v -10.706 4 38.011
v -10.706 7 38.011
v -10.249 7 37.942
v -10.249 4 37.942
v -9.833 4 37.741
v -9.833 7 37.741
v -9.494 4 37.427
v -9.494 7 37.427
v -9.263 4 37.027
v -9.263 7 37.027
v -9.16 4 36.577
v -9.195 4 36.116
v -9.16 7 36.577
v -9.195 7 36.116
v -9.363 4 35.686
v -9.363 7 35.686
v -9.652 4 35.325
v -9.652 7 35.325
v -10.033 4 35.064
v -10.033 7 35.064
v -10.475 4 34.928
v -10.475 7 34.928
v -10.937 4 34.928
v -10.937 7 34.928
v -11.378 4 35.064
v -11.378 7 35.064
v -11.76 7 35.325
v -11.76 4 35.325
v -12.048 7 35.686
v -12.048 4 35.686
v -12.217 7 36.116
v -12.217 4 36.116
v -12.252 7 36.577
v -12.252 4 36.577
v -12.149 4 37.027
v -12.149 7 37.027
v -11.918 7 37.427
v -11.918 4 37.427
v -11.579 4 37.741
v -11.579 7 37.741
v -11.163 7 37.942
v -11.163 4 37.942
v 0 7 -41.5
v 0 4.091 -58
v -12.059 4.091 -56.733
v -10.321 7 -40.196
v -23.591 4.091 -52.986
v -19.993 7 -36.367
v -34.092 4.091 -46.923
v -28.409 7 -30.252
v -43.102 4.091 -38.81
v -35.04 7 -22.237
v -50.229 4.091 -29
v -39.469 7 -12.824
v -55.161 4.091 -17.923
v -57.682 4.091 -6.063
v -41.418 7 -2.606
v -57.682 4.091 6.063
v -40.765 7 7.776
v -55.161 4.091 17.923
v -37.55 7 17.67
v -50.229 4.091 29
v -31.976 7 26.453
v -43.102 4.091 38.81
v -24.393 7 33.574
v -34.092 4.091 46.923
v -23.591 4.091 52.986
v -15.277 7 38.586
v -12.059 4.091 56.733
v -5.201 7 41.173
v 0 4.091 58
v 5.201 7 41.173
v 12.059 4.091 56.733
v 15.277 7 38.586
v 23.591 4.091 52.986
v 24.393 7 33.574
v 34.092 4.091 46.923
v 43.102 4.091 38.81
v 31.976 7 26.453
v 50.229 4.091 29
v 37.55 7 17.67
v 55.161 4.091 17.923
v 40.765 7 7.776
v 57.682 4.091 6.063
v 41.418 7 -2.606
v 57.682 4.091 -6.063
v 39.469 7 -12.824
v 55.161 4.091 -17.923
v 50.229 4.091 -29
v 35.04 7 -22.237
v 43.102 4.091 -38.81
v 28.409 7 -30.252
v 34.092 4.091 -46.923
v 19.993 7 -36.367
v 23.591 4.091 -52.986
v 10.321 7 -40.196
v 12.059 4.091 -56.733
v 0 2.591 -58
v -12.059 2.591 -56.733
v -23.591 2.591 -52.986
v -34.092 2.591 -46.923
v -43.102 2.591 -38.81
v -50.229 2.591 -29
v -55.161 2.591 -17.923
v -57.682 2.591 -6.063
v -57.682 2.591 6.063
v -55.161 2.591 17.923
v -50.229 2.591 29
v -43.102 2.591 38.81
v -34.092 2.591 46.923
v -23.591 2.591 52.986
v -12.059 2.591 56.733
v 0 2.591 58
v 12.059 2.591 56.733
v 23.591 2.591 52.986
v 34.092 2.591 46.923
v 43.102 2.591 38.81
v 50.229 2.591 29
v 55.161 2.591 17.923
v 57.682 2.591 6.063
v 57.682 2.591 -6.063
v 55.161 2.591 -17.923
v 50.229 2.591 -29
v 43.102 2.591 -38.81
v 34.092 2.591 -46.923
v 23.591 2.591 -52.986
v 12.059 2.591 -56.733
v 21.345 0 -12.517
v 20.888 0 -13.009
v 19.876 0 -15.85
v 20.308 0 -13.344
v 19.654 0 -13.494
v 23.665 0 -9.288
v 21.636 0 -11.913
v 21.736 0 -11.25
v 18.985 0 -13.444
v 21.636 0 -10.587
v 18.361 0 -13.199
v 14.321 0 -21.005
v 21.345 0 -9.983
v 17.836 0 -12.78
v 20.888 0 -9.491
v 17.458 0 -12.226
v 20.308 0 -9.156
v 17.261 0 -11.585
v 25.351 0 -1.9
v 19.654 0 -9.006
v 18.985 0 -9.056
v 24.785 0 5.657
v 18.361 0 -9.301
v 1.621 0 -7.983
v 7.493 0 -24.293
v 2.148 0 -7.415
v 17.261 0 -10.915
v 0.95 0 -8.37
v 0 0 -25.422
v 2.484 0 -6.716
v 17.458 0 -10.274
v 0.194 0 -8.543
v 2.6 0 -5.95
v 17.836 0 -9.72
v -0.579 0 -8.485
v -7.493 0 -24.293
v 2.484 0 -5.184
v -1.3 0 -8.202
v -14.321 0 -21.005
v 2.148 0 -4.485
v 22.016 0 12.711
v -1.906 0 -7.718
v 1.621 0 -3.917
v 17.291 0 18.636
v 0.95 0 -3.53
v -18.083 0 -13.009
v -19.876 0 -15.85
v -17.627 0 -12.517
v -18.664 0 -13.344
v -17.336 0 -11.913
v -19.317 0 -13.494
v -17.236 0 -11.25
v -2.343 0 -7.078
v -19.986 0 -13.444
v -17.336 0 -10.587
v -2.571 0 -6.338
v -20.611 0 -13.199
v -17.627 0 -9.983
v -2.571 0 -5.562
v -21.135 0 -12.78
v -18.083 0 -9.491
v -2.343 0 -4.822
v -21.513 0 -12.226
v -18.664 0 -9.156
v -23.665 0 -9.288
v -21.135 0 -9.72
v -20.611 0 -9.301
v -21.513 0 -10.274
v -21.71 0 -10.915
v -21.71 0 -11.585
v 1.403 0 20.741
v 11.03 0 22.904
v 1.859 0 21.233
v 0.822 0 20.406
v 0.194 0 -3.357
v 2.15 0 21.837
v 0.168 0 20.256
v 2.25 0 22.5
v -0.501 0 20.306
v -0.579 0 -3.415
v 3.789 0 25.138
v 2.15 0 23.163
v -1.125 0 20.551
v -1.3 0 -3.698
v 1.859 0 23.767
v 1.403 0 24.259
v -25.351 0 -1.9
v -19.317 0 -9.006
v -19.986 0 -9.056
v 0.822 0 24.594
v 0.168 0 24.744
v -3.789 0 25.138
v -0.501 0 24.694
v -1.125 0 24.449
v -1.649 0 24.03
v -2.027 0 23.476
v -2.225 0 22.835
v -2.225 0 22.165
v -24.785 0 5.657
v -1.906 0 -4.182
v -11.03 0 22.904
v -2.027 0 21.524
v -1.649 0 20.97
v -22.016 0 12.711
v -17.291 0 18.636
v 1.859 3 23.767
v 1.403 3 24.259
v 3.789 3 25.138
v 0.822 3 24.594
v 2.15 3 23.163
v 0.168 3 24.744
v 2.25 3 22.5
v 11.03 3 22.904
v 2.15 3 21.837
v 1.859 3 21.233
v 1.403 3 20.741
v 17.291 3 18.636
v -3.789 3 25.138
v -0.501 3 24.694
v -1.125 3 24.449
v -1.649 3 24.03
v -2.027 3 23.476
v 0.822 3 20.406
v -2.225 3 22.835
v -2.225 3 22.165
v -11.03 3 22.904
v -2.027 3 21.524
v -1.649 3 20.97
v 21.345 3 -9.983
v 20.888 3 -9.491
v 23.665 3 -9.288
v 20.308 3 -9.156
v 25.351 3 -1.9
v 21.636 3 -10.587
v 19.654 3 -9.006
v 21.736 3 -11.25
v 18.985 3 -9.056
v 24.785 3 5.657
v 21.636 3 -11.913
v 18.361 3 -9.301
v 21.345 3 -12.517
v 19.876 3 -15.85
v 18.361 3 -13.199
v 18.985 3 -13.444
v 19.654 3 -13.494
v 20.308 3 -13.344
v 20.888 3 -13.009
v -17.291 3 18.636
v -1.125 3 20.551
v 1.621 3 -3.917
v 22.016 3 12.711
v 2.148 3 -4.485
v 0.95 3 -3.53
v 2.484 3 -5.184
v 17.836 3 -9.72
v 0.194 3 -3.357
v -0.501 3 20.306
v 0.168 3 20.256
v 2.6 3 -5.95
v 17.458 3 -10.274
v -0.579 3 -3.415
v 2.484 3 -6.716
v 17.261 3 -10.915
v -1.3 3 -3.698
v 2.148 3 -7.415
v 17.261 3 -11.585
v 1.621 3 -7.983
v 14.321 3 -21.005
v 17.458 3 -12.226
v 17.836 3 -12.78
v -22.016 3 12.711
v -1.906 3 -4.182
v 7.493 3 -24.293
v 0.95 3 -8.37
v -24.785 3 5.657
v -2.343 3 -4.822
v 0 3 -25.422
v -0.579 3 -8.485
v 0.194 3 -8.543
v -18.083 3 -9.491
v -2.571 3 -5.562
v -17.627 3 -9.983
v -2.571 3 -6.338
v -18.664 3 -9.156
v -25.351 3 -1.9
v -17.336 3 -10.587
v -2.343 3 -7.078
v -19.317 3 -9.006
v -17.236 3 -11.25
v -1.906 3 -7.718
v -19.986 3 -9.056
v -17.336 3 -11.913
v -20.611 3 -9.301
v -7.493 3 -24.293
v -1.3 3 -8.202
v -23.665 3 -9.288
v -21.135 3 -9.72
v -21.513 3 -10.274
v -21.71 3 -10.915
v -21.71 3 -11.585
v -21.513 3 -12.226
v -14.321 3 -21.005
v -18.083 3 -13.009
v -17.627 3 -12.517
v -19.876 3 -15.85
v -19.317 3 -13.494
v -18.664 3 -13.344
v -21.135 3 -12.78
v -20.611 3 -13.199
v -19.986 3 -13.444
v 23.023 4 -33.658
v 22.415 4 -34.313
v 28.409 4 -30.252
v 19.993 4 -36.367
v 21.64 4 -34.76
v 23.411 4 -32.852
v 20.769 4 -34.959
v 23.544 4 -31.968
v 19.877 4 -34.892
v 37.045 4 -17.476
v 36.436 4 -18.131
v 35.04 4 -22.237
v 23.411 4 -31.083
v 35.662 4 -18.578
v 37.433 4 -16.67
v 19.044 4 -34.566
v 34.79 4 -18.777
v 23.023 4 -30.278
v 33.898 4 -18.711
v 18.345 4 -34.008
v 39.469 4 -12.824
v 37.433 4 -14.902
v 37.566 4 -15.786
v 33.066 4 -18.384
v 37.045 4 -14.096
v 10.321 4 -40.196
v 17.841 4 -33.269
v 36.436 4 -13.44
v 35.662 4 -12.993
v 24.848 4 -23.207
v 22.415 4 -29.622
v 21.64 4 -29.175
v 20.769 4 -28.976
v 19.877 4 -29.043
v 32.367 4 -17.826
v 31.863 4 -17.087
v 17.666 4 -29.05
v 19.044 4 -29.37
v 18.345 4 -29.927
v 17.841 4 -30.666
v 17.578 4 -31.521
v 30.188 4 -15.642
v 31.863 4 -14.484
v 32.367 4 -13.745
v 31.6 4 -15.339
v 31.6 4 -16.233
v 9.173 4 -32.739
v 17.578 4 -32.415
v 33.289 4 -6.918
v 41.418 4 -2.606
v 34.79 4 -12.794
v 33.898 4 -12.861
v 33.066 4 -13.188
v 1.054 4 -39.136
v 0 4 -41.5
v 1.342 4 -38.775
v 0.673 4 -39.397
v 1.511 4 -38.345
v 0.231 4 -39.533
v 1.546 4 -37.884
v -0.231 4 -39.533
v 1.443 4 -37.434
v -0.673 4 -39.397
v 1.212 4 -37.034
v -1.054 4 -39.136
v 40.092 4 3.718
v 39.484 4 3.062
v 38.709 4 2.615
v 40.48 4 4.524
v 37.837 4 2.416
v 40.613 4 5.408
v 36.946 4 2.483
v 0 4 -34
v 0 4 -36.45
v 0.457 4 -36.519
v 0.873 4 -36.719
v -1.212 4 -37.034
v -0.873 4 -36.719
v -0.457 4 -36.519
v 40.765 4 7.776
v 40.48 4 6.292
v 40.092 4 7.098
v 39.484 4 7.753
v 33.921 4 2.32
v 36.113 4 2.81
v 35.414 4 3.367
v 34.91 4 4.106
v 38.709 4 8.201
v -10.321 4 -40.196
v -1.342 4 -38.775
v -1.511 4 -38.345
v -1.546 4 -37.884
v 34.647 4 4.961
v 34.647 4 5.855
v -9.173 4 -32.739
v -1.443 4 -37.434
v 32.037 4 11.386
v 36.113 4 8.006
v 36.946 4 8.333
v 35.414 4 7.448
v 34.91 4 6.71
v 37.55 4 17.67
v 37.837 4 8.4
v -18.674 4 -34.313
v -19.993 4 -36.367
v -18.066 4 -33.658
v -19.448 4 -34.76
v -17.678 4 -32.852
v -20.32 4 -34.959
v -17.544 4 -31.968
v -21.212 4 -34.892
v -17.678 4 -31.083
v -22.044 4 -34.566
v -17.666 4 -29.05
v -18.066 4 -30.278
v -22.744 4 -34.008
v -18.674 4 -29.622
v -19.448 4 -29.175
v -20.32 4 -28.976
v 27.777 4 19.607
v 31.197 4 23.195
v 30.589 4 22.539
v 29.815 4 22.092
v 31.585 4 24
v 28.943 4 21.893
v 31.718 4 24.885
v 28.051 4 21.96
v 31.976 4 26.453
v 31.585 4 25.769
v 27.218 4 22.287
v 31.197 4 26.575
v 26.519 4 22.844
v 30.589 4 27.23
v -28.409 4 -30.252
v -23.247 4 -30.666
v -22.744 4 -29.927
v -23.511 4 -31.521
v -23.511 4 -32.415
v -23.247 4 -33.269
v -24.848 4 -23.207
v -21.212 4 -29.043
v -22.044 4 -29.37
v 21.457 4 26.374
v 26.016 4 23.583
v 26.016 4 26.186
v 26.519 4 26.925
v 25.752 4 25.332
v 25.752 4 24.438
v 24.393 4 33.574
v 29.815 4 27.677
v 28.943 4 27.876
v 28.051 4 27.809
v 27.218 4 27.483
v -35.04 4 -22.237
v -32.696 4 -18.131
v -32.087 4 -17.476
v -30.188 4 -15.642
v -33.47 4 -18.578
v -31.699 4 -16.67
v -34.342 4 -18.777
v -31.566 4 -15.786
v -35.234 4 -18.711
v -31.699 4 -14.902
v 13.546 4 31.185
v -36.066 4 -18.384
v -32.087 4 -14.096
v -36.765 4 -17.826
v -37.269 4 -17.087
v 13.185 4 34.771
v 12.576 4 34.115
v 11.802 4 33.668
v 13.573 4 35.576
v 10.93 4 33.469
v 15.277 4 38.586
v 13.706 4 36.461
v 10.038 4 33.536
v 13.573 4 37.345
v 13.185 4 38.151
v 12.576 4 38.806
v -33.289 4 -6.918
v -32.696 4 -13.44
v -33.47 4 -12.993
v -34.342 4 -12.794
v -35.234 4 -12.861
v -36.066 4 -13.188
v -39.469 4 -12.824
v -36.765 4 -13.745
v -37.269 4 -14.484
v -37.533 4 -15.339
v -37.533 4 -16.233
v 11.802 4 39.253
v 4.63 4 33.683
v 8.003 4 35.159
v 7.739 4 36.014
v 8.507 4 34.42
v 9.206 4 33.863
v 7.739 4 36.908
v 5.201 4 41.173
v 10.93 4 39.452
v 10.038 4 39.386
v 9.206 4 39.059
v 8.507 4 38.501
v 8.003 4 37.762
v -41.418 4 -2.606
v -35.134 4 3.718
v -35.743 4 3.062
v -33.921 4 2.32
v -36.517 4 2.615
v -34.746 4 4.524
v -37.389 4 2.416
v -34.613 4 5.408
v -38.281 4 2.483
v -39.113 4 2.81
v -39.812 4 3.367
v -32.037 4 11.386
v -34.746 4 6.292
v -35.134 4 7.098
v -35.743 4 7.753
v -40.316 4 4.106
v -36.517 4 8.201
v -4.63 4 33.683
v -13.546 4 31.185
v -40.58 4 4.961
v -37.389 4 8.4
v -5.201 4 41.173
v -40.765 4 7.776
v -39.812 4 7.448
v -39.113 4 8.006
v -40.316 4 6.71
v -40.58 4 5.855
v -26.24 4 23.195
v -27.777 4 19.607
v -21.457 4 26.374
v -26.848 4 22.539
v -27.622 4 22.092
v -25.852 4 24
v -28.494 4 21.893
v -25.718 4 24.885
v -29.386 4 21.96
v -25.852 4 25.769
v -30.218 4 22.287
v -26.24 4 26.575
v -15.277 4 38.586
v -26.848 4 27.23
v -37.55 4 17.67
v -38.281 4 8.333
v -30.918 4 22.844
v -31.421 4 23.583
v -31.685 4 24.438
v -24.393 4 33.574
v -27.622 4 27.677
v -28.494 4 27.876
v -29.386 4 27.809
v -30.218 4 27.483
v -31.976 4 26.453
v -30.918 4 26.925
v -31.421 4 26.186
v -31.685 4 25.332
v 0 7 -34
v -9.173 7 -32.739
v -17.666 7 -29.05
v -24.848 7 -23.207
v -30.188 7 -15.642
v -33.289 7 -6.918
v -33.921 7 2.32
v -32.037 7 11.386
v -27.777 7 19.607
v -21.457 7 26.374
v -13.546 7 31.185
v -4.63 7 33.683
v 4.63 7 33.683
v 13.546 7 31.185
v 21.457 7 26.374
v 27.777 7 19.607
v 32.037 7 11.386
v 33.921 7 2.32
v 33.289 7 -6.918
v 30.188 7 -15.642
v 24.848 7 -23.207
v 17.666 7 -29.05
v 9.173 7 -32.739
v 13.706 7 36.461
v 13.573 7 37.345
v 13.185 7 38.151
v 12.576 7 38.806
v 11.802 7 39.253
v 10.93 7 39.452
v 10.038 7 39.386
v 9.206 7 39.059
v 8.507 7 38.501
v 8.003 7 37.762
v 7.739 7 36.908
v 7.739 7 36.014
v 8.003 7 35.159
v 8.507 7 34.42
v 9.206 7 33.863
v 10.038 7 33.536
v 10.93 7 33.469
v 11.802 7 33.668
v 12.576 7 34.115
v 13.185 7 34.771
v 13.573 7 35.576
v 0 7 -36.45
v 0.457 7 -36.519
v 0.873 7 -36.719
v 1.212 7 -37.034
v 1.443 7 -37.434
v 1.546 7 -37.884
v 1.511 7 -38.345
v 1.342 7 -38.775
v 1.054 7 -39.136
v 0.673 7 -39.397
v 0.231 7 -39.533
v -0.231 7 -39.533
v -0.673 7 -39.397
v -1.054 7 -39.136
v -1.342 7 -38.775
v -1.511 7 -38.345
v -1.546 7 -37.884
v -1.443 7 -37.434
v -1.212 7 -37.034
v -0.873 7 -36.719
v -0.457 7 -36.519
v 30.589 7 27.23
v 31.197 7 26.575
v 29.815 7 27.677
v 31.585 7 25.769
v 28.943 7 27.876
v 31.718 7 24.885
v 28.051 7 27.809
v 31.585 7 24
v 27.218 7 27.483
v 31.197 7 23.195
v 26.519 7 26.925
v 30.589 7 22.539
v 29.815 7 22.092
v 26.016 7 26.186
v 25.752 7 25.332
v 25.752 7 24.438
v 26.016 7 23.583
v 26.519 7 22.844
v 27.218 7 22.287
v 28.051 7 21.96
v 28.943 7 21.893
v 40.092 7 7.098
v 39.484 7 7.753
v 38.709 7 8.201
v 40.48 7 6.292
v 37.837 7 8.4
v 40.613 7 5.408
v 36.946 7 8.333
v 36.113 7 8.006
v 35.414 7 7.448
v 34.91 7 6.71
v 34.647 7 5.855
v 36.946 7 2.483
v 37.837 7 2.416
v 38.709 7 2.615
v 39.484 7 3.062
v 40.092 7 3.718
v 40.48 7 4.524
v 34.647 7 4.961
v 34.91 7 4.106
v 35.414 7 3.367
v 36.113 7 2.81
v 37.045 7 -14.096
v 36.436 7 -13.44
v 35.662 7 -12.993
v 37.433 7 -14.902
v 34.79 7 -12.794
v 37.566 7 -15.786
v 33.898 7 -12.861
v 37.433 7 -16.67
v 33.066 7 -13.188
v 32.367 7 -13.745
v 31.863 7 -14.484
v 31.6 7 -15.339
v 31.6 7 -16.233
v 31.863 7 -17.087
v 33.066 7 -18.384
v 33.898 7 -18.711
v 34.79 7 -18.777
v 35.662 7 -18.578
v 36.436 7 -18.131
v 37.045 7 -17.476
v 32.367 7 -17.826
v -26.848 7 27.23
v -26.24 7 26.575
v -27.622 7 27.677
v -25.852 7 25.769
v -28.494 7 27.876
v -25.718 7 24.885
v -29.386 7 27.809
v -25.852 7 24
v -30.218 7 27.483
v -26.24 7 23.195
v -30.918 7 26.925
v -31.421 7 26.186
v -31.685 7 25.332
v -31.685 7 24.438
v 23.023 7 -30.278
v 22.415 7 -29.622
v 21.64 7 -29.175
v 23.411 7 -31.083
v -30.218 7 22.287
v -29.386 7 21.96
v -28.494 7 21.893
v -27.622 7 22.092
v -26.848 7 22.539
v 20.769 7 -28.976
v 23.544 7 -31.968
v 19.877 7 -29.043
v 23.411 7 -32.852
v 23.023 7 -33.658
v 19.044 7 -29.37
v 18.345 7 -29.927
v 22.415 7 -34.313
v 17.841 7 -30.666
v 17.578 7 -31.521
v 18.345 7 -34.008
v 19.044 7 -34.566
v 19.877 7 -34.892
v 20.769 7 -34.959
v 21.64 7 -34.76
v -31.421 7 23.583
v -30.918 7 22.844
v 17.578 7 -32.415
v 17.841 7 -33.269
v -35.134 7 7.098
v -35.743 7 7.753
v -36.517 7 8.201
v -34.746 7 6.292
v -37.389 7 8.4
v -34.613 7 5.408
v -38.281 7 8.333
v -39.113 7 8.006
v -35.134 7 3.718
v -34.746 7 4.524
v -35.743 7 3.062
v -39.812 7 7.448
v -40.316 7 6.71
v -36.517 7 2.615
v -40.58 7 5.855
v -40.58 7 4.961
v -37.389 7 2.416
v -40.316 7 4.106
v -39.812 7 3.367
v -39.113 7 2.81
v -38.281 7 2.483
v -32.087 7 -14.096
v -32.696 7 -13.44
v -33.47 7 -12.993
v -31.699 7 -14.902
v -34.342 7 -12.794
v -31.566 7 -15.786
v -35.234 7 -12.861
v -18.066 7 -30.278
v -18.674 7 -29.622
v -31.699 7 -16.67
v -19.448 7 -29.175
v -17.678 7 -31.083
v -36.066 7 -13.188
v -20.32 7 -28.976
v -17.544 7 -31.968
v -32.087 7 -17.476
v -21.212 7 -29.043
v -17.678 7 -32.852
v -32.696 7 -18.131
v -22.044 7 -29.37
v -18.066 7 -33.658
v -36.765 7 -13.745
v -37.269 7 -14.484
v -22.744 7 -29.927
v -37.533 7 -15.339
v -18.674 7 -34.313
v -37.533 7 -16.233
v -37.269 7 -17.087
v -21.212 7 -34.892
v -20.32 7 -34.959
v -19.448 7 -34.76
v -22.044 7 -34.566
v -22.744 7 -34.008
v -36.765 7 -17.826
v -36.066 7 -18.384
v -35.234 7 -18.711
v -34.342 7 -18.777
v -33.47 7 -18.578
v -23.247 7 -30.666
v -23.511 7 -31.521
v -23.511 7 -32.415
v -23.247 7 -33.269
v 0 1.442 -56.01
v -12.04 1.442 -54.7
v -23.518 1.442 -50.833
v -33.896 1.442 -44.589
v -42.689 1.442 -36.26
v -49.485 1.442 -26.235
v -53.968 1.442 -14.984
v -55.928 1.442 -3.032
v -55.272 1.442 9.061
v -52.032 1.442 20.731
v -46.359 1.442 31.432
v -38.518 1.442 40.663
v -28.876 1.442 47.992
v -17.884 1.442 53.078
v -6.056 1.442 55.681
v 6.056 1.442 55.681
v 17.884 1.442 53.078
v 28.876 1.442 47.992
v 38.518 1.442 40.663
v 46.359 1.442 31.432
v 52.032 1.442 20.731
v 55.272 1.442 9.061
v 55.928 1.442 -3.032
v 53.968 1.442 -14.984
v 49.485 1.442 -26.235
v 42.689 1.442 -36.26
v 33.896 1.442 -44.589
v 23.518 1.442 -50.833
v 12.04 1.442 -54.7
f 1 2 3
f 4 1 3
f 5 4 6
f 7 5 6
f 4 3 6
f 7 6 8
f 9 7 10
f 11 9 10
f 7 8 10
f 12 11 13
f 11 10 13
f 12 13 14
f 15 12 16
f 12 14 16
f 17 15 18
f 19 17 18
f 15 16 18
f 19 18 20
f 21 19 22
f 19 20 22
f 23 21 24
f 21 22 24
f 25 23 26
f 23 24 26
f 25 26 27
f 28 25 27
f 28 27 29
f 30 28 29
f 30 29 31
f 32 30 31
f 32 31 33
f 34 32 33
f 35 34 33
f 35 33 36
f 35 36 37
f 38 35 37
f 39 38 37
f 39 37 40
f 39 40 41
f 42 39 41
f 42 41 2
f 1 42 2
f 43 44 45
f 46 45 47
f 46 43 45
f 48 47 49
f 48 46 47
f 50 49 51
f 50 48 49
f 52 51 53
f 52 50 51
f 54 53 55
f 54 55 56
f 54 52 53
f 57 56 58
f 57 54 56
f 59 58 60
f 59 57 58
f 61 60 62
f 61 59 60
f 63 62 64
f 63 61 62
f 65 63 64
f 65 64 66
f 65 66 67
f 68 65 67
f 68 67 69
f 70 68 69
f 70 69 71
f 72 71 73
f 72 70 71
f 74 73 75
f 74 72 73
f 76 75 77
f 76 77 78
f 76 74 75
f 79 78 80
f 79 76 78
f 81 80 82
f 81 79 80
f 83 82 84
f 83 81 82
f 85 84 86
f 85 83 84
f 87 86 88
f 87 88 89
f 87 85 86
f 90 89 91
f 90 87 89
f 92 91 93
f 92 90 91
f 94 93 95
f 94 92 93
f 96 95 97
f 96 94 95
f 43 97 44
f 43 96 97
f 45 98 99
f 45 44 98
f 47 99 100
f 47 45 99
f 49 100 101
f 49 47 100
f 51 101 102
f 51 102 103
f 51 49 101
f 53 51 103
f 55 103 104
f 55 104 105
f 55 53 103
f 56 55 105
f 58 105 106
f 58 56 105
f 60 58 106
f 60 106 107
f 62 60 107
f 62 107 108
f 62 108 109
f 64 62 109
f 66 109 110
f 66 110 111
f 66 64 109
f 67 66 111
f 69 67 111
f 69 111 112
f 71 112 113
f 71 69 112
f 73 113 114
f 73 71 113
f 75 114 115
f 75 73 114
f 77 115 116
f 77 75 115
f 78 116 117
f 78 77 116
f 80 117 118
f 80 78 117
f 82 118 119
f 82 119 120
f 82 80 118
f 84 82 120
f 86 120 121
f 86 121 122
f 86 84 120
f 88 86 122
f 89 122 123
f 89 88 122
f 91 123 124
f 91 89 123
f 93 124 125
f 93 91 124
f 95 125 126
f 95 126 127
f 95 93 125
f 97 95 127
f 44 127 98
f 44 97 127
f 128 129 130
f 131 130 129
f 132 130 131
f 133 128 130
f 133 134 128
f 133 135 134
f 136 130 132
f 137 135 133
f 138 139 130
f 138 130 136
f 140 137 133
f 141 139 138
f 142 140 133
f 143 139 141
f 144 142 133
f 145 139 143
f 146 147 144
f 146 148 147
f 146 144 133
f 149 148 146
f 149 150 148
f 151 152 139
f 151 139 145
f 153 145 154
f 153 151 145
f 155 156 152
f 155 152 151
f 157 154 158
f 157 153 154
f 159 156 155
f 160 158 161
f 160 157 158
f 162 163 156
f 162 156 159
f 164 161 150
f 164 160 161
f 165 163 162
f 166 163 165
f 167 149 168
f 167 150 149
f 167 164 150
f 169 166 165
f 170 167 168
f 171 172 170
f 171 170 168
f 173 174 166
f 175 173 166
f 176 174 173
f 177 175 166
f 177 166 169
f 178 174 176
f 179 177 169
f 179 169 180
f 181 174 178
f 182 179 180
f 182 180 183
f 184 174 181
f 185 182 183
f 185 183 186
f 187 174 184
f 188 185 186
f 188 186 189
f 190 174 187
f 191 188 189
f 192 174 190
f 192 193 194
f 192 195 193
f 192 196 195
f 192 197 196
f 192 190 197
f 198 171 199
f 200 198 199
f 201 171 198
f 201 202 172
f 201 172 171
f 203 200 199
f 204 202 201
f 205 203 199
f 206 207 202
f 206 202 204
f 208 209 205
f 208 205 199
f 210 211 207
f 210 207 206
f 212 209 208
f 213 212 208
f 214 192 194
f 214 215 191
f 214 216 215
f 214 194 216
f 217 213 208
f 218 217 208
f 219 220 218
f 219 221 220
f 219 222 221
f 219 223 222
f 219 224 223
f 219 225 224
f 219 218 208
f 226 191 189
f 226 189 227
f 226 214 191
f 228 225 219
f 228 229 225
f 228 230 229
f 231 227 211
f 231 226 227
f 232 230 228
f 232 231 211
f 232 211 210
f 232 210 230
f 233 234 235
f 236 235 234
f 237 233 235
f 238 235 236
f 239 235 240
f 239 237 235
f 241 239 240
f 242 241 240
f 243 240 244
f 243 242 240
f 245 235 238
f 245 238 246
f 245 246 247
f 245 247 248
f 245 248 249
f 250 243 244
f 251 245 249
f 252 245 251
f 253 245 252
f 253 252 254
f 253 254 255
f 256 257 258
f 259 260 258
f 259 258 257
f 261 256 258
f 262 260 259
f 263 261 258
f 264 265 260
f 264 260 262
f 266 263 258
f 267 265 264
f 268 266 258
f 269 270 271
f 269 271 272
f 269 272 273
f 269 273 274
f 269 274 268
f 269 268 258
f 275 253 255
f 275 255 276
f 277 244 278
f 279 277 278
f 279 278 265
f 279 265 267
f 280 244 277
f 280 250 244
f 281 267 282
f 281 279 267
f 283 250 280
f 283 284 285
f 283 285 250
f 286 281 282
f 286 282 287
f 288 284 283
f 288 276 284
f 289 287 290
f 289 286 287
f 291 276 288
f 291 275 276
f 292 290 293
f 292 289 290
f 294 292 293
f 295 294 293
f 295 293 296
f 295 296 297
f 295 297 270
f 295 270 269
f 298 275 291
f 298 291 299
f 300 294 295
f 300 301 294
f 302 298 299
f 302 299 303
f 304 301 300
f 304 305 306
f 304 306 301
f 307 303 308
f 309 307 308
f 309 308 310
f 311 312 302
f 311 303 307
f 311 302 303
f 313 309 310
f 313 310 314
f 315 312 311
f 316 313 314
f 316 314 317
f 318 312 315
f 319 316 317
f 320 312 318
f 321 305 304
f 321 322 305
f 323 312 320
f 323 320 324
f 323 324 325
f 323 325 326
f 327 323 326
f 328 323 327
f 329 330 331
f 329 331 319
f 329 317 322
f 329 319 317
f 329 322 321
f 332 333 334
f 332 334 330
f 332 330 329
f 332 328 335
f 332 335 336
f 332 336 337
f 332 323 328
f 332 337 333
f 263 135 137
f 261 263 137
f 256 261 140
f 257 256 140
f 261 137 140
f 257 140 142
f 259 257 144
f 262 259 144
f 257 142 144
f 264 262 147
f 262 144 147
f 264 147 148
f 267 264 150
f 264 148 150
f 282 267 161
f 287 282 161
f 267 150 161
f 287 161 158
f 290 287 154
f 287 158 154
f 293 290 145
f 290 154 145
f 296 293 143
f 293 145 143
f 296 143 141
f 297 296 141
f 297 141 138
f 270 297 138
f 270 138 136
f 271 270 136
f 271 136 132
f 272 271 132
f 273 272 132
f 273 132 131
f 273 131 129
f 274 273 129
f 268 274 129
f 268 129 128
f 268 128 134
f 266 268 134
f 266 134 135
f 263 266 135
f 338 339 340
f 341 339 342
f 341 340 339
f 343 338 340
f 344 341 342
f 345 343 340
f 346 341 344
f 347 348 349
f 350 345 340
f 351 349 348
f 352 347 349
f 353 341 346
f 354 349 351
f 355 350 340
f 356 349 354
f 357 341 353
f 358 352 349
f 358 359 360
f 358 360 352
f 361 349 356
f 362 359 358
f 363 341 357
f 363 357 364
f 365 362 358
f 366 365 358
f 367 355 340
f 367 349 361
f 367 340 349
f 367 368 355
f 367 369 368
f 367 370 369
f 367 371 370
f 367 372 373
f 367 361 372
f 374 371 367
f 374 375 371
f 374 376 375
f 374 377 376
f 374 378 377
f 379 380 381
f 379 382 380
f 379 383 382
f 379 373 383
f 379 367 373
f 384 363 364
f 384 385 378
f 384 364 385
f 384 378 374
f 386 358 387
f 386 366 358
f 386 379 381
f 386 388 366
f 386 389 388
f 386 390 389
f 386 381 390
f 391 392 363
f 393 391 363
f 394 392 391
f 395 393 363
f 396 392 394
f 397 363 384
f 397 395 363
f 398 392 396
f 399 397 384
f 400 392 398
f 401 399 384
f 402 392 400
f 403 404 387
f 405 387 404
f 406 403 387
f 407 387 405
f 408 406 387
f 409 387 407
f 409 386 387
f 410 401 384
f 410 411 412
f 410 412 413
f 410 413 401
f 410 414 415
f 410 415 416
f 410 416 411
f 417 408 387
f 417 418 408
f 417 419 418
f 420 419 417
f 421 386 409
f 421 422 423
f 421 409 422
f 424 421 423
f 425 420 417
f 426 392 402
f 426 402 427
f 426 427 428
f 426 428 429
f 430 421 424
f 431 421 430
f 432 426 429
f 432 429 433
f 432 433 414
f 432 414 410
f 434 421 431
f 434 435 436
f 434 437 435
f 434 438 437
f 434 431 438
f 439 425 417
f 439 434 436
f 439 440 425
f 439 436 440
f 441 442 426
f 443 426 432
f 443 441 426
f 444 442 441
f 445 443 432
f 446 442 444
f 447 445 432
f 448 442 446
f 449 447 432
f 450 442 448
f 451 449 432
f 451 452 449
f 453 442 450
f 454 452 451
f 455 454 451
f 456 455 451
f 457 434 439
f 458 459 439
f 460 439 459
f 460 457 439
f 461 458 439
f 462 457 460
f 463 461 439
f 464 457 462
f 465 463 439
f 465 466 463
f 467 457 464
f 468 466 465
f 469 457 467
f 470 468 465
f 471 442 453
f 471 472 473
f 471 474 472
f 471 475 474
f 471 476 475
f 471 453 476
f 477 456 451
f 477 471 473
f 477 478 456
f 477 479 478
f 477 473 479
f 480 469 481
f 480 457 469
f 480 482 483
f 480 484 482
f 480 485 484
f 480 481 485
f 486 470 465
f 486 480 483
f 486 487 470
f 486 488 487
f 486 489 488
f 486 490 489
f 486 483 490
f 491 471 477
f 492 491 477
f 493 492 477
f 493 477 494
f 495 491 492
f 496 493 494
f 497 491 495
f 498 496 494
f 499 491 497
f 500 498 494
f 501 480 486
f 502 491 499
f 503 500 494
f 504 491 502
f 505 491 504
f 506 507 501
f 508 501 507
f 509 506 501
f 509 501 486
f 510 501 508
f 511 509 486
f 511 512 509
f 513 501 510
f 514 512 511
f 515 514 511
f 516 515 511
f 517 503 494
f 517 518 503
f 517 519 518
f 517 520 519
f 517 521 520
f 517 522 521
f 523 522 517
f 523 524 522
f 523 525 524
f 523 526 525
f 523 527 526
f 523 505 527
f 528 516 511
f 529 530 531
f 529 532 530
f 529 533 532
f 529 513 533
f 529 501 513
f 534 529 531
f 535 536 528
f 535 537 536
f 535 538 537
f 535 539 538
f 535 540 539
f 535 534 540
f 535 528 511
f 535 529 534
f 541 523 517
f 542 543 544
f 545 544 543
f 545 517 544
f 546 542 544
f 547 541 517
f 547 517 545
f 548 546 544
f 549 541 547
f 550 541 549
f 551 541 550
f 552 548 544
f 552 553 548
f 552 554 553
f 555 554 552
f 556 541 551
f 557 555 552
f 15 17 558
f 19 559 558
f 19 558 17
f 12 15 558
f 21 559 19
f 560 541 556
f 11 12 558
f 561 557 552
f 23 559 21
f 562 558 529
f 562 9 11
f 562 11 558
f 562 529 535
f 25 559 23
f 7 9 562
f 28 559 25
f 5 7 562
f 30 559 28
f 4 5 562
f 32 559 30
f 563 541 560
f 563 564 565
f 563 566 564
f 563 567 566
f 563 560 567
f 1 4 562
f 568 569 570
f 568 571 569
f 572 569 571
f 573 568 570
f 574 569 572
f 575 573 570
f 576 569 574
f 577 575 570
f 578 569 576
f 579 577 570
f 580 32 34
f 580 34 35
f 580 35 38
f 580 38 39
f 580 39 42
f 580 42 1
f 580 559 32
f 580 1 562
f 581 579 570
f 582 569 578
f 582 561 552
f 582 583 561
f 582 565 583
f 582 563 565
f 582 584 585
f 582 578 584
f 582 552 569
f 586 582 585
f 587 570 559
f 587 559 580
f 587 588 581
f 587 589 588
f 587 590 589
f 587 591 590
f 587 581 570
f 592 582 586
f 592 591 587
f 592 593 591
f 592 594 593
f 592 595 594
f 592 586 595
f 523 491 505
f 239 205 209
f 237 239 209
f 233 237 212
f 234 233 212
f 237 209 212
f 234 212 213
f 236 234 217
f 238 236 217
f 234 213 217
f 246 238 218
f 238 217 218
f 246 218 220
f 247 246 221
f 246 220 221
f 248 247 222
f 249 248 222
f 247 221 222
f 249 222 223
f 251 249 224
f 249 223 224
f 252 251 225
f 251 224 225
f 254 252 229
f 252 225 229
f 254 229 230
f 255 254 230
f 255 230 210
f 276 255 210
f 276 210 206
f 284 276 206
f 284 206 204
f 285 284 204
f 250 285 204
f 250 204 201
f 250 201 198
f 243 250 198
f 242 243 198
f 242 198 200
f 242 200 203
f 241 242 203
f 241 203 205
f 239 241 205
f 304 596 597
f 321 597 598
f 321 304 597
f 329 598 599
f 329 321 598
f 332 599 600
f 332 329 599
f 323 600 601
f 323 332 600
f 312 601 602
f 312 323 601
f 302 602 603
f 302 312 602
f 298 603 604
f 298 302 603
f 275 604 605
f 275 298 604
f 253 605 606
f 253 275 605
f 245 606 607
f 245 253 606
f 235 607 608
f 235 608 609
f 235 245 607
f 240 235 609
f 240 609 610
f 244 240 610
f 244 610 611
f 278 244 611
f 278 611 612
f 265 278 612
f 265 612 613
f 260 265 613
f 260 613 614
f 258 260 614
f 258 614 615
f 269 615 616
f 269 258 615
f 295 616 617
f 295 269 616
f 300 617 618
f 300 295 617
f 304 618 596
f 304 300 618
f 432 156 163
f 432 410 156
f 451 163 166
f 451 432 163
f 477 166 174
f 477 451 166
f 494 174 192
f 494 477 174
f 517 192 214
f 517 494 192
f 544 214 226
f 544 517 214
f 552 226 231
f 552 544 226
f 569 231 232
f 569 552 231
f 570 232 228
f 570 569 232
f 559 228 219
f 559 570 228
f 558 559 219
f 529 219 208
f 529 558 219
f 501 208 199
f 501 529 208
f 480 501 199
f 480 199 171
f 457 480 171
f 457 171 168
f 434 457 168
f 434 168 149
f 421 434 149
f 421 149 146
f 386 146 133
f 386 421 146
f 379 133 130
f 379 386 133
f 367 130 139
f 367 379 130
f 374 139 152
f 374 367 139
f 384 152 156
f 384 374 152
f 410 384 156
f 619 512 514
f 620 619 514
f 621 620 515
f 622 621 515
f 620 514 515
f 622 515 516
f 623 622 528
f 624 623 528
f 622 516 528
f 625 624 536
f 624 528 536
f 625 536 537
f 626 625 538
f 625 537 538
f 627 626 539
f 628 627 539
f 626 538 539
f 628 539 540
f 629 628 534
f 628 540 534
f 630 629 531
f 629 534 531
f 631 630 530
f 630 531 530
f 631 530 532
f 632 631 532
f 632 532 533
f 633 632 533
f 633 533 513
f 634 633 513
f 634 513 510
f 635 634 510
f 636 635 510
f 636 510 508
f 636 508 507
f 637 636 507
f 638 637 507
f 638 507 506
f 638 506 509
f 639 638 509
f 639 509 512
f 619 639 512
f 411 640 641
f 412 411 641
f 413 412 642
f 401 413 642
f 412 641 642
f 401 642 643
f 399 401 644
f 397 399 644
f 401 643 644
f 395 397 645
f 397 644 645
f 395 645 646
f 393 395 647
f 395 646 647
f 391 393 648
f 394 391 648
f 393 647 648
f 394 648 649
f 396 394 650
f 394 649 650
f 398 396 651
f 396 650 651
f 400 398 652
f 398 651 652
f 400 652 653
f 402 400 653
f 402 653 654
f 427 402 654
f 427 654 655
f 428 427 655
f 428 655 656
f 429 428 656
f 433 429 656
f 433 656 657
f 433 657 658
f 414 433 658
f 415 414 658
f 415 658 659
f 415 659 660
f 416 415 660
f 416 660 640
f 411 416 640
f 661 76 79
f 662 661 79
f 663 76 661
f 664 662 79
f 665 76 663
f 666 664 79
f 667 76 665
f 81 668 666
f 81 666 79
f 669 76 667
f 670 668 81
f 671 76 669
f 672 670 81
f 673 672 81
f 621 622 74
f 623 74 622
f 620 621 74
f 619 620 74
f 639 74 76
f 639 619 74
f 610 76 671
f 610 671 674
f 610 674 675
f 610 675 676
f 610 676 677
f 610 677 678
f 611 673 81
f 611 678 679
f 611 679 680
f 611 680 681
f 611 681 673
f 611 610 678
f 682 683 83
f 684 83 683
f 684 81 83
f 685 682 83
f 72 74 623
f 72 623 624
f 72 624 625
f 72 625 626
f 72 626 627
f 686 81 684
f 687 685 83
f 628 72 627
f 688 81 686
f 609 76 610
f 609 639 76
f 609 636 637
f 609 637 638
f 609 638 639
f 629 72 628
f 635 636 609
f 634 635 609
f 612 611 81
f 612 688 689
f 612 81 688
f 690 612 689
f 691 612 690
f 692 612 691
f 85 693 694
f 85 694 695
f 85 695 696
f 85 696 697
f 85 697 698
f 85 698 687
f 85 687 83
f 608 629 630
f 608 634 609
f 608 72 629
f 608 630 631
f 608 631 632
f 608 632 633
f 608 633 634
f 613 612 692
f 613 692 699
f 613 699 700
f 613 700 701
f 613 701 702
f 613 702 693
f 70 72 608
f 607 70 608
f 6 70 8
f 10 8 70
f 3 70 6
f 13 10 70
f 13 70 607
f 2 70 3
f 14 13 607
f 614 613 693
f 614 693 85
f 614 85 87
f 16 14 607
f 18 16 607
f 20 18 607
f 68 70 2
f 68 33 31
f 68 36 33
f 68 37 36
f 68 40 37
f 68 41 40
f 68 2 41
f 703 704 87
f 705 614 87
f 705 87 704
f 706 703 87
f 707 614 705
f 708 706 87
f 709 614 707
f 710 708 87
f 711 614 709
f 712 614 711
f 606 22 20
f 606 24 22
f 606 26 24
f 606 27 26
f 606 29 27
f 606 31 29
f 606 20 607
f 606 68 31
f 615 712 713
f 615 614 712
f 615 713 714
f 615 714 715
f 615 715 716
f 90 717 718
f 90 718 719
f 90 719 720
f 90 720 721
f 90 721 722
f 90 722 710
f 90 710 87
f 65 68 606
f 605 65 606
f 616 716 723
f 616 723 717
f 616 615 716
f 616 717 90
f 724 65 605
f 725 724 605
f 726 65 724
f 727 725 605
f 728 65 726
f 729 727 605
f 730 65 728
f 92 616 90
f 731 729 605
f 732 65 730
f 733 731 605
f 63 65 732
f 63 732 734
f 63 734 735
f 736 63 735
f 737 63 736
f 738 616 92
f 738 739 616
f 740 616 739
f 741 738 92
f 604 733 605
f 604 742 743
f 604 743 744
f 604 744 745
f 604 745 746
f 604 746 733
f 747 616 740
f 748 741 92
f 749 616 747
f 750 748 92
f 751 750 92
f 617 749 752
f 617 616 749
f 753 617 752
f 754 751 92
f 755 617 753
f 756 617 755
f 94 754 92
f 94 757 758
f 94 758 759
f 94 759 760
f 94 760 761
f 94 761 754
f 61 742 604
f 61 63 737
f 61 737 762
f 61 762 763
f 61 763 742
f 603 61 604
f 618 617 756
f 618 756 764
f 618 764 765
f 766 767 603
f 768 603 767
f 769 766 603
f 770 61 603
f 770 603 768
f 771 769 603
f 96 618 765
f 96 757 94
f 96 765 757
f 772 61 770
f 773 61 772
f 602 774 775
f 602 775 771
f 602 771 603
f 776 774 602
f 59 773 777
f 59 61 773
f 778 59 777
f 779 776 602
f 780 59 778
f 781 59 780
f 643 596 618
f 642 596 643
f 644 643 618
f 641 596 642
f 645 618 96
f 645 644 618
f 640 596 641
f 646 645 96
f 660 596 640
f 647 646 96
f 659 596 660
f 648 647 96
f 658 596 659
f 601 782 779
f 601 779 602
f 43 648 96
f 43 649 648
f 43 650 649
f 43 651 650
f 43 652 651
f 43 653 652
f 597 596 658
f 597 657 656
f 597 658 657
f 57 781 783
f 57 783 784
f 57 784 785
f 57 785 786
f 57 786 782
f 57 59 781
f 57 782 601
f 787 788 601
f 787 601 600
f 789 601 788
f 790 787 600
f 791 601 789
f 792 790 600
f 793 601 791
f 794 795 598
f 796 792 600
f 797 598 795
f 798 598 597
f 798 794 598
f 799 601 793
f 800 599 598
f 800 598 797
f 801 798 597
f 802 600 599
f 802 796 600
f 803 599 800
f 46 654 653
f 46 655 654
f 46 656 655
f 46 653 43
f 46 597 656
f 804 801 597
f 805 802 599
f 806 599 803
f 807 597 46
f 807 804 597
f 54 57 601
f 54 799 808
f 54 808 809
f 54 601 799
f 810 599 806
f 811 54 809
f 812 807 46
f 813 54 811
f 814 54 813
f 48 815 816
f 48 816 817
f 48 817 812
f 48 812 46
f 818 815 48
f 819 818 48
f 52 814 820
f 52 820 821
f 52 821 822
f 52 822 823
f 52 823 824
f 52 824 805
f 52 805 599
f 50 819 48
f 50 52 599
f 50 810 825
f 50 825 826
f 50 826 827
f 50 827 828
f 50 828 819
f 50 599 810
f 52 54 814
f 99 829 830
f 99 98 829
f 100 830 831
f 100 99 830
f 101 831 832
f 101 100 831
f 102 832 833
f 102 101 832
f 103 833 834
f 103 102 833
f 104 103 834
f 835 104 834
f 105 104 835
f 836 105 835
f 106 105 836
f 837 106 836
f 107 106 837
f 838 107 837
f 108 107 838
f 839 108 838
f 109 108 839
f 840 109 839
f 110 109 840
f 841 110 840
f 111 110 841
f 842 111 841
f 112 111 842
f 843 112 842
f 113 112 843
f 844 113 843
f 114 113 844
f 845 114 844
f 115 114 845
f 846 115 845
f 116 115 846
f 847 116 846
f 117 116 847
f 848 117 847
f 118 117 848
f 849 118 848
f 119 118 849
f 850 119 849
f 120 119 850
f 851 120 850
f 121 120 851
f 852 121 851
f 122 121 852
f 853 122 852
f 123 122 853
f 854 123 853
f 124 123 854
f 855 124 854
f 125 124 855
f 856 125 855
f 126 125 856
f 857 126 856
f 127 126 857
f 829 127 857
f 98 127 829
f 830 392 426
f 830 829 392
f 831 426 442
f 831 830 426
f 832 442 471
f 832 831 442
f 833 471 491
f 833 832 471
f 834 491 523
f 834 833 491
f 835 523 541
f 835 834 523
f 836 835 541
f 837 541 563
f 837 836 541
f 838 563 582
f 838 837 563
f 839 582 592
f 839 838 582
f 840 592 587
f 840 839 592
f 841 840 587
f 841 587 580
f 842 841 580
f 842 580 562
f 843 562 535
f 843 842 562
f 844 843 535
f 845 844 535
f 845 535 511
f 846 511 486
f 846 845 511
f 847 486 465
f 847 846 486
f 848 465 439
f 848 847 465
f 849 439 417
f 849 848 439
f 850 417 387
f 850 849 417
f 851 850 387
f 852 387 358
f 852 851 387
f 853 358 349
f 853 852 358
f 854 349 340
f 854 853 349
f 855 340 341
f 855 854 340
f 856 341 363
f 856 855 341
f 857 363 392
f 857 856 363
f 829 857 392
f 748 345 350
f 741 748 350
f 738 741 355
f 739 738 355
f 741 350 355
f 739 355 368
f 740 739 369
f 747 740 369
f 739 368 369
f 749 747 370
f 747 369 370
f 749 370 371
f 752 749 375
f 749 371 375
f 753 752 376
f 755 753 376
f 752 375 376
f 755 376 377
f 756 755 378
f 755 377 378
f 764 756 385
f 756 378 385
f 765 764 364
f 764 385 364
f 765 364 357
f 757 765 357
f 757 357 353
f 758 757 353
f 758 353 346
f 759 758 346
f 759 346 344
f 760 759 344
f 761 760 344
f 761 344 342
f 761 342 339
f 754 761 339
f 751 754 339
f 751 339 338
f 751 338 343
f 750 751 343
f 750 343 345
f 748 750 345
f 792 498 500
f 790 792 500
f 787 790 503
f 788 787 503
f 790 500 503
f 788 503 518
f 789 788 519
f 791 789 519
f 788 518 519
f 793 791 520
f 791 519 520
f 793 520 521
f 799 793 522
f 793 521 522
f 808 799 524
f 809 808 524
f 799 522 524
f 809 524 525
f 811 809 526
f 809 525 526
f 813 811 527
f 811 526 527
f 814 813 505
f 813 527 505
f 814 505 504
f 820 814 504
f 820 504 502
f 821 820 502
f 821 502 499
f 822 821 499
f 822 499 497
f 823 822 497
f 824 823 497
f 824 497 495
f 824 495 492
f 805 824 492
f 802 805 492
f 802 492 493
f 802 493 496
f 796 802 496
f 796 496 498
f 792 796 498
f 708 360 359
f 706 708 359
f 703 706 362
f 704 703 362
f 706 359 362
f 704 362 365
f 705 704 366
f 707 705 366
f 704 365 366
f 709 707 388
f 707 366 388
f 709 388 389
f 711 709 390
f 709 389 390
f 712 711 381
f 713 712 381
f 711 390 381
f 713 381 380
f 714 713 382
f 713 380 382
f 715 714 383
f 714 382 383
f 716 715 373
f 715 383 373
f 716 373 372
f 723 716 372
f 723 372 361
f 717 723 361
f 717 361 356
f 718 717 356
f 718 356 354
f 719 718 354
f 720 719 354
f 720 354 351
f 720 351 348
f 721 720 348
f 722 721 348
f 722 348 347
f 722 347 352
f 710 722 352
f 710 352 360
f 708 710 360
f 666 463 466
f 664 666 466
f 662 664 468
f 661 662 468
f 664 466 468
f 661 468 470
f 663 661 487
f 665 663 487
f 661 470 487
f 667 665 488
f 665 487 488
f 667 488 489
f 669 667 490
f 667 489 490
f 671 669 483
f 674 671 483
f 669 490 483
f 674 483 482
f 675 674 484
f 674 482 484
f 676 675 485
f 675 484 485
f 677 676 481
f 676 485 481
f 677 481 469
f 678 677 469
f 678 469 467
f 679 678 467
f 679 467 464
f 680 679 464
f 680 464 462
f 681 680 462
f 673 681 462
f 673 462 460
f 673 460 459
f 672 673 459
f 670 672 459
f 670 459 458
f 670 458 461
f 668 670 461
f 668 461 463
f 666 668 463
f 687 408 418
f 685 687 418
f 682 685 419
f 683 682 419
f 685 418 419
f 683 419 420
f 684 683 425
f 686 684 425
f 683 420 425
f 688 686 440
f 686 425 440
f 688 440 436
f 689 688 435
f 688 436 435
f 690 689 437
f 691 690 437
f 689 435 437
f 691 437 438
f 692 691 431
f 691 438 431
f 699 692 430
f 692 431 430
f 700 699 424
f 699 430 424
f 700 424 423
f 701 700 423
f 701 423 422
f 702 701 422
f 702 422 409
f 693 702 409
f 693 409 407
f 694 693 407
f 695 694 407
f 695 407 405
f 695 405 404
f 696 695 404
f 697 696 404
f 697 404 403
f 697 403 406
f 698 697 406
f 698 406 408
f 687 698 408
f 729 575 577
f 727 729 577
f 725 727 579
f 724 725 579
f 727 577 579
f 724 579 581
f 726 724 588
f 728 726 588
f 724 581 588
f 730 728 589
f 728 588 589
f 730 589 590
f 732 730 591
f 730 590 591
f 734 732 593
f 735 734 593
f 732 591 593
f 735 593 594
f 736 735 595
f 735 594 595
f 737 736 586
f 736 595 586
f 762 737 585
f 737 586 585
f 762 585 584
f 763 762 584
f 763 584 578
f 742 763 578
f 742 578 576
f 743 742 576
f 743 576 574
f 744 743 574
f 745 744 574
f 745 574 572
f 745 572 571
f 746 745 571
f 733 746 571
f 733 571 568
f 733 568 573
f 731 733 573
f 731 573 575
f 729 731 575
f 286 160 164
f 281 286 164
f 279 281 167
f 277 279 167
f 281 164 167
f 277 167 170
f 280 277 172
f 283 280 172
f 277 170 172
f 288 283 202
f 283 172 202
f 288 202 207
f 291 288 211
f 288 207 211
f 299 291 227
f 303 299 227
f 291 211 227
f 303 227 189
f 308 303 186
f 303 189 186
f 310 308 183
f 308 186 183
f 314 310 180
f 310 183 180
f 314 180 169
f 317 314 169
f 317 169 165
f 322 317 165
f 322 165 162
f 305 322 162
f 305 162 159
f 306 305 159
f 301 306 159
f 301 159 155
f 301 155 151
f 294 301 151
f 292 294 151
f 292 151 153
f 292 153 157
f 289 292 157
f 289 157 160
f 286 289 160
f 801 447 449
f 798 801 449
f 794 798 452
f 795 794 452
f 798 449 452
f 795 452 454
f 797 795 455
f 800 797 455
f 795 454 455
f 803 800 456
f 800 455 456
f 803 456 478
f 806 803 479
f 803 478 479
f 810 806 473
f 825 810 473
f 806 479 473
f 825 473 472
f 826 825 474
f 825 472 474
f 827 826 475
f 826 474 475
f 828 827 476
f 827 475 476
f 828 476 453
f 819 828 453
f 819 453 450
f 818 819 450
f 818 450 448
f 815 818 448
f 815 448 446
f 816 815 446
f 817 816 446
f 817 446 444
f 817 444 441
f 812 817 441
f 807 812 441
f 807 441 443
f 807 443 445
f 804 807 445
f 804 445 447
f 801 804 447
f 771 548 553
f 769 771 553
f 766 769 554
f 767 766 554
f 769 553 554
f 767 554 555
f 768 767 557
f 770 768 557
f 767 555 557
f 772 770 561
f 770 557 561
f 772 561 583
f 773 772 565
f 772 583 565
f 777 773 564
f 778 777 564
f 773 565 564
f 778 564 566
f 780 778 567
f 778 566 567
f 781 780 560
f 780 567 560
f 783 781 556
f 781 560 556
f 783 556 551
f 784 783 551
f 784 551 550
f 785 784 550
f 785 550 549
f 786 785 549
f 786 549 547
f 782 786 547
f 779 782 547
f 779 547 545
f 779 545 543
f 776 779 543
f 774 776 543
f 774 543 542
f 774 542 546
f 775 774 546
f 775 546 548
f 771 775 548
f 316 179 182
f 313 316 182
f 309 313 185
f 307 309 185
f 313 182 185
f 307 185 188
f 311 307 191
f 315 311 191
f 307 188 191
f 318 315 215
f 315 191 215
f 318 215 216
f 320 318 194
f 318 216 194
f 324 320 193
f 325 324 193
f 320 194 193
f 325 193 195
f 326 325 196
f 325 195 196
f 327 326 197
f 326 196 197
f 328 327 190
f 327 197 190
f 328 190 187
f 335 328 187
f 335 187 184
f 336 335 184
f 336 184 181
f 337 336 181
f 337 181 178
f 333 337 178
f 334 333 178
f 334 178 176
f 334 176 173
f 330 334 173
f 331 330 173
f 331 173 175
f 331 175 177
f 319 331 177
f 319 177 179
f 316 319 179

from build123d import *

# Parameters (mm, degrees)
SKETCH_3_R          = 1.55
CUT_EXTRUDE_3_DEPTH = 83.322536404
SKETCH_4_R          = 3
CUT_EXTRUDE_5_DEPTH = 83.121860671
SKETCH_5_R          = 2.25
SKETCH_5_R_2        = 2.6
CUT_EXTRUDE_6_DEPTH = 83.322536404


with BuildPart() as part:
    # 草图1 → 旋转2 (revolve)
    with BuildSketch(Plane.XY, mode=Mode.PRIVATE) as revolve_2_sk:
        Polygon((25.421972318, 0), (34, 4), (41.5, 4), (56.009758155, 1.441538154), (58, 2.590604818), (58, 4.090604818), (41.5, 7), (34, 7), (25.421972318, 3), (0, 3), (0, 0), align=None)
    revolve(revolve_2_sk.sketch.rotate(Axis((0, 0, 0), (0, 1, 0)), 90), axis=Axis((0, 0, 0), (0, 1, 0)))

    # 草图3 → 切除-拉伸3 (cut, through all)
    with BuildSketch(Plane(origin=(0, 7, 0), x_dir=(1, 0, 0), z_dir=(0, 1, 0))):
        with Locations(Location((0, 38, 0), (0, 0, 270))):
            Circle(SKETCH_3_R)
        with Locations(Location((20.544351063, 31.967634248, 0), (0, 0, 270))):
            Circle(SKETCH_3_R)
        with Locations(Location((34.566015823, 15.785770494, 0), (0, 0, 270))):
            Circle(SKETCH_3_R)
        with Locations(Location((37.613214791, -5.407963854, 0), (0, 0, 270))):
            Circle(SKETCH_3_R)
        with Locations(Location((28.718483825, -24.88470789, 0), (0, 0, 270))):
            Circle(SKETCH_3_R)
        with Locations(Location((10.70583716, -36.460732997, 0), (0, 0, 270))):
            Circle(SKETCH_3_R)
        with Locations(Location((-10.70583716, -36.460732997, 0), (0, 0, 270))):
            Circle(SKETCH_3_R)
        with Locations(Location((-28.718483825, -24.88470789, 0), (0, 0, 270))):
            Circle(SKETCH_3_R)
        with Locations(Location((-37.613214791, -5.407963854, 0), (0, 0, 270))):
            Circle(SKETCH_3_R)
        with Locations(Location((-34.566015823, 15.785770494, 0), (0, 0, 270))):
            Circle(SKETCH_3_R)
        with Locations(Location((-20.544351063, 31.967634248, 0), (0, 0, 270))):
            Circle(SKETCH_3_R)
    extrude(amount=-CUT_EXTRUDE_3_DEPTH, mode=Mode.SUBTRACT)

    # 草图4 → 切除-拉伸5 (cut, through all)
    with BuildSketch(Plane.XZ.offset(-4)):
        with Locations((10.70583716, 36.460732997)):
            Circle(SKETCH_4_R)
        with Locations((28.718483825, 24.88470789)):
            Circle(SKETCH_4_R)
        with Locations((37.613214791, 5.407963854)):
            Circle(SKETCH_4_R)
        with Locations((-28.718483825, 24.88470789)):
            Circle(SKETCH_4_R)
        with Locations((-34.566015823, -15.785770494)):
            Circle(SKETCH_4_R)
        with Locations((-20.544351063, -31.967634248)):
            Circle(SKETCH_4_R)
        with Locations((20.544351063, -31.967634248)):
            Circle(SKETCH_4_R)
        with Locations((34.566015823, -15.785770494)):
            Circle(SKETCH_4_R)
        with Locations((-37.613214791, 5.407963854)):
            Circle(SKETCH_4_R)
    extrude(amount=-CUT_EXTRUDE_5_DEPTH, mode=Mode.SUBTRACT)

    # 草图5 → 切除-拉伸6 (cut, through all)
    with BuildSketch(Plane.XZ):
        with Locations((-19.485571585, -11.25)):
            Circle(SKETCH_5_R)
        with Locations((19.485571585, -11.25)):
            Circle(SKETCH_5_R)
        with Locations((0, 22.5)):
            Circle(SKETCH_5_R)
        with Locations((0, -5.95)):
            Circle(SKETCH_5_R_2)
    extrude(amount=-CUT_EXTRUDE_6_DEPTH, mode=Mode.SUBTRACT)


solid = part.part
